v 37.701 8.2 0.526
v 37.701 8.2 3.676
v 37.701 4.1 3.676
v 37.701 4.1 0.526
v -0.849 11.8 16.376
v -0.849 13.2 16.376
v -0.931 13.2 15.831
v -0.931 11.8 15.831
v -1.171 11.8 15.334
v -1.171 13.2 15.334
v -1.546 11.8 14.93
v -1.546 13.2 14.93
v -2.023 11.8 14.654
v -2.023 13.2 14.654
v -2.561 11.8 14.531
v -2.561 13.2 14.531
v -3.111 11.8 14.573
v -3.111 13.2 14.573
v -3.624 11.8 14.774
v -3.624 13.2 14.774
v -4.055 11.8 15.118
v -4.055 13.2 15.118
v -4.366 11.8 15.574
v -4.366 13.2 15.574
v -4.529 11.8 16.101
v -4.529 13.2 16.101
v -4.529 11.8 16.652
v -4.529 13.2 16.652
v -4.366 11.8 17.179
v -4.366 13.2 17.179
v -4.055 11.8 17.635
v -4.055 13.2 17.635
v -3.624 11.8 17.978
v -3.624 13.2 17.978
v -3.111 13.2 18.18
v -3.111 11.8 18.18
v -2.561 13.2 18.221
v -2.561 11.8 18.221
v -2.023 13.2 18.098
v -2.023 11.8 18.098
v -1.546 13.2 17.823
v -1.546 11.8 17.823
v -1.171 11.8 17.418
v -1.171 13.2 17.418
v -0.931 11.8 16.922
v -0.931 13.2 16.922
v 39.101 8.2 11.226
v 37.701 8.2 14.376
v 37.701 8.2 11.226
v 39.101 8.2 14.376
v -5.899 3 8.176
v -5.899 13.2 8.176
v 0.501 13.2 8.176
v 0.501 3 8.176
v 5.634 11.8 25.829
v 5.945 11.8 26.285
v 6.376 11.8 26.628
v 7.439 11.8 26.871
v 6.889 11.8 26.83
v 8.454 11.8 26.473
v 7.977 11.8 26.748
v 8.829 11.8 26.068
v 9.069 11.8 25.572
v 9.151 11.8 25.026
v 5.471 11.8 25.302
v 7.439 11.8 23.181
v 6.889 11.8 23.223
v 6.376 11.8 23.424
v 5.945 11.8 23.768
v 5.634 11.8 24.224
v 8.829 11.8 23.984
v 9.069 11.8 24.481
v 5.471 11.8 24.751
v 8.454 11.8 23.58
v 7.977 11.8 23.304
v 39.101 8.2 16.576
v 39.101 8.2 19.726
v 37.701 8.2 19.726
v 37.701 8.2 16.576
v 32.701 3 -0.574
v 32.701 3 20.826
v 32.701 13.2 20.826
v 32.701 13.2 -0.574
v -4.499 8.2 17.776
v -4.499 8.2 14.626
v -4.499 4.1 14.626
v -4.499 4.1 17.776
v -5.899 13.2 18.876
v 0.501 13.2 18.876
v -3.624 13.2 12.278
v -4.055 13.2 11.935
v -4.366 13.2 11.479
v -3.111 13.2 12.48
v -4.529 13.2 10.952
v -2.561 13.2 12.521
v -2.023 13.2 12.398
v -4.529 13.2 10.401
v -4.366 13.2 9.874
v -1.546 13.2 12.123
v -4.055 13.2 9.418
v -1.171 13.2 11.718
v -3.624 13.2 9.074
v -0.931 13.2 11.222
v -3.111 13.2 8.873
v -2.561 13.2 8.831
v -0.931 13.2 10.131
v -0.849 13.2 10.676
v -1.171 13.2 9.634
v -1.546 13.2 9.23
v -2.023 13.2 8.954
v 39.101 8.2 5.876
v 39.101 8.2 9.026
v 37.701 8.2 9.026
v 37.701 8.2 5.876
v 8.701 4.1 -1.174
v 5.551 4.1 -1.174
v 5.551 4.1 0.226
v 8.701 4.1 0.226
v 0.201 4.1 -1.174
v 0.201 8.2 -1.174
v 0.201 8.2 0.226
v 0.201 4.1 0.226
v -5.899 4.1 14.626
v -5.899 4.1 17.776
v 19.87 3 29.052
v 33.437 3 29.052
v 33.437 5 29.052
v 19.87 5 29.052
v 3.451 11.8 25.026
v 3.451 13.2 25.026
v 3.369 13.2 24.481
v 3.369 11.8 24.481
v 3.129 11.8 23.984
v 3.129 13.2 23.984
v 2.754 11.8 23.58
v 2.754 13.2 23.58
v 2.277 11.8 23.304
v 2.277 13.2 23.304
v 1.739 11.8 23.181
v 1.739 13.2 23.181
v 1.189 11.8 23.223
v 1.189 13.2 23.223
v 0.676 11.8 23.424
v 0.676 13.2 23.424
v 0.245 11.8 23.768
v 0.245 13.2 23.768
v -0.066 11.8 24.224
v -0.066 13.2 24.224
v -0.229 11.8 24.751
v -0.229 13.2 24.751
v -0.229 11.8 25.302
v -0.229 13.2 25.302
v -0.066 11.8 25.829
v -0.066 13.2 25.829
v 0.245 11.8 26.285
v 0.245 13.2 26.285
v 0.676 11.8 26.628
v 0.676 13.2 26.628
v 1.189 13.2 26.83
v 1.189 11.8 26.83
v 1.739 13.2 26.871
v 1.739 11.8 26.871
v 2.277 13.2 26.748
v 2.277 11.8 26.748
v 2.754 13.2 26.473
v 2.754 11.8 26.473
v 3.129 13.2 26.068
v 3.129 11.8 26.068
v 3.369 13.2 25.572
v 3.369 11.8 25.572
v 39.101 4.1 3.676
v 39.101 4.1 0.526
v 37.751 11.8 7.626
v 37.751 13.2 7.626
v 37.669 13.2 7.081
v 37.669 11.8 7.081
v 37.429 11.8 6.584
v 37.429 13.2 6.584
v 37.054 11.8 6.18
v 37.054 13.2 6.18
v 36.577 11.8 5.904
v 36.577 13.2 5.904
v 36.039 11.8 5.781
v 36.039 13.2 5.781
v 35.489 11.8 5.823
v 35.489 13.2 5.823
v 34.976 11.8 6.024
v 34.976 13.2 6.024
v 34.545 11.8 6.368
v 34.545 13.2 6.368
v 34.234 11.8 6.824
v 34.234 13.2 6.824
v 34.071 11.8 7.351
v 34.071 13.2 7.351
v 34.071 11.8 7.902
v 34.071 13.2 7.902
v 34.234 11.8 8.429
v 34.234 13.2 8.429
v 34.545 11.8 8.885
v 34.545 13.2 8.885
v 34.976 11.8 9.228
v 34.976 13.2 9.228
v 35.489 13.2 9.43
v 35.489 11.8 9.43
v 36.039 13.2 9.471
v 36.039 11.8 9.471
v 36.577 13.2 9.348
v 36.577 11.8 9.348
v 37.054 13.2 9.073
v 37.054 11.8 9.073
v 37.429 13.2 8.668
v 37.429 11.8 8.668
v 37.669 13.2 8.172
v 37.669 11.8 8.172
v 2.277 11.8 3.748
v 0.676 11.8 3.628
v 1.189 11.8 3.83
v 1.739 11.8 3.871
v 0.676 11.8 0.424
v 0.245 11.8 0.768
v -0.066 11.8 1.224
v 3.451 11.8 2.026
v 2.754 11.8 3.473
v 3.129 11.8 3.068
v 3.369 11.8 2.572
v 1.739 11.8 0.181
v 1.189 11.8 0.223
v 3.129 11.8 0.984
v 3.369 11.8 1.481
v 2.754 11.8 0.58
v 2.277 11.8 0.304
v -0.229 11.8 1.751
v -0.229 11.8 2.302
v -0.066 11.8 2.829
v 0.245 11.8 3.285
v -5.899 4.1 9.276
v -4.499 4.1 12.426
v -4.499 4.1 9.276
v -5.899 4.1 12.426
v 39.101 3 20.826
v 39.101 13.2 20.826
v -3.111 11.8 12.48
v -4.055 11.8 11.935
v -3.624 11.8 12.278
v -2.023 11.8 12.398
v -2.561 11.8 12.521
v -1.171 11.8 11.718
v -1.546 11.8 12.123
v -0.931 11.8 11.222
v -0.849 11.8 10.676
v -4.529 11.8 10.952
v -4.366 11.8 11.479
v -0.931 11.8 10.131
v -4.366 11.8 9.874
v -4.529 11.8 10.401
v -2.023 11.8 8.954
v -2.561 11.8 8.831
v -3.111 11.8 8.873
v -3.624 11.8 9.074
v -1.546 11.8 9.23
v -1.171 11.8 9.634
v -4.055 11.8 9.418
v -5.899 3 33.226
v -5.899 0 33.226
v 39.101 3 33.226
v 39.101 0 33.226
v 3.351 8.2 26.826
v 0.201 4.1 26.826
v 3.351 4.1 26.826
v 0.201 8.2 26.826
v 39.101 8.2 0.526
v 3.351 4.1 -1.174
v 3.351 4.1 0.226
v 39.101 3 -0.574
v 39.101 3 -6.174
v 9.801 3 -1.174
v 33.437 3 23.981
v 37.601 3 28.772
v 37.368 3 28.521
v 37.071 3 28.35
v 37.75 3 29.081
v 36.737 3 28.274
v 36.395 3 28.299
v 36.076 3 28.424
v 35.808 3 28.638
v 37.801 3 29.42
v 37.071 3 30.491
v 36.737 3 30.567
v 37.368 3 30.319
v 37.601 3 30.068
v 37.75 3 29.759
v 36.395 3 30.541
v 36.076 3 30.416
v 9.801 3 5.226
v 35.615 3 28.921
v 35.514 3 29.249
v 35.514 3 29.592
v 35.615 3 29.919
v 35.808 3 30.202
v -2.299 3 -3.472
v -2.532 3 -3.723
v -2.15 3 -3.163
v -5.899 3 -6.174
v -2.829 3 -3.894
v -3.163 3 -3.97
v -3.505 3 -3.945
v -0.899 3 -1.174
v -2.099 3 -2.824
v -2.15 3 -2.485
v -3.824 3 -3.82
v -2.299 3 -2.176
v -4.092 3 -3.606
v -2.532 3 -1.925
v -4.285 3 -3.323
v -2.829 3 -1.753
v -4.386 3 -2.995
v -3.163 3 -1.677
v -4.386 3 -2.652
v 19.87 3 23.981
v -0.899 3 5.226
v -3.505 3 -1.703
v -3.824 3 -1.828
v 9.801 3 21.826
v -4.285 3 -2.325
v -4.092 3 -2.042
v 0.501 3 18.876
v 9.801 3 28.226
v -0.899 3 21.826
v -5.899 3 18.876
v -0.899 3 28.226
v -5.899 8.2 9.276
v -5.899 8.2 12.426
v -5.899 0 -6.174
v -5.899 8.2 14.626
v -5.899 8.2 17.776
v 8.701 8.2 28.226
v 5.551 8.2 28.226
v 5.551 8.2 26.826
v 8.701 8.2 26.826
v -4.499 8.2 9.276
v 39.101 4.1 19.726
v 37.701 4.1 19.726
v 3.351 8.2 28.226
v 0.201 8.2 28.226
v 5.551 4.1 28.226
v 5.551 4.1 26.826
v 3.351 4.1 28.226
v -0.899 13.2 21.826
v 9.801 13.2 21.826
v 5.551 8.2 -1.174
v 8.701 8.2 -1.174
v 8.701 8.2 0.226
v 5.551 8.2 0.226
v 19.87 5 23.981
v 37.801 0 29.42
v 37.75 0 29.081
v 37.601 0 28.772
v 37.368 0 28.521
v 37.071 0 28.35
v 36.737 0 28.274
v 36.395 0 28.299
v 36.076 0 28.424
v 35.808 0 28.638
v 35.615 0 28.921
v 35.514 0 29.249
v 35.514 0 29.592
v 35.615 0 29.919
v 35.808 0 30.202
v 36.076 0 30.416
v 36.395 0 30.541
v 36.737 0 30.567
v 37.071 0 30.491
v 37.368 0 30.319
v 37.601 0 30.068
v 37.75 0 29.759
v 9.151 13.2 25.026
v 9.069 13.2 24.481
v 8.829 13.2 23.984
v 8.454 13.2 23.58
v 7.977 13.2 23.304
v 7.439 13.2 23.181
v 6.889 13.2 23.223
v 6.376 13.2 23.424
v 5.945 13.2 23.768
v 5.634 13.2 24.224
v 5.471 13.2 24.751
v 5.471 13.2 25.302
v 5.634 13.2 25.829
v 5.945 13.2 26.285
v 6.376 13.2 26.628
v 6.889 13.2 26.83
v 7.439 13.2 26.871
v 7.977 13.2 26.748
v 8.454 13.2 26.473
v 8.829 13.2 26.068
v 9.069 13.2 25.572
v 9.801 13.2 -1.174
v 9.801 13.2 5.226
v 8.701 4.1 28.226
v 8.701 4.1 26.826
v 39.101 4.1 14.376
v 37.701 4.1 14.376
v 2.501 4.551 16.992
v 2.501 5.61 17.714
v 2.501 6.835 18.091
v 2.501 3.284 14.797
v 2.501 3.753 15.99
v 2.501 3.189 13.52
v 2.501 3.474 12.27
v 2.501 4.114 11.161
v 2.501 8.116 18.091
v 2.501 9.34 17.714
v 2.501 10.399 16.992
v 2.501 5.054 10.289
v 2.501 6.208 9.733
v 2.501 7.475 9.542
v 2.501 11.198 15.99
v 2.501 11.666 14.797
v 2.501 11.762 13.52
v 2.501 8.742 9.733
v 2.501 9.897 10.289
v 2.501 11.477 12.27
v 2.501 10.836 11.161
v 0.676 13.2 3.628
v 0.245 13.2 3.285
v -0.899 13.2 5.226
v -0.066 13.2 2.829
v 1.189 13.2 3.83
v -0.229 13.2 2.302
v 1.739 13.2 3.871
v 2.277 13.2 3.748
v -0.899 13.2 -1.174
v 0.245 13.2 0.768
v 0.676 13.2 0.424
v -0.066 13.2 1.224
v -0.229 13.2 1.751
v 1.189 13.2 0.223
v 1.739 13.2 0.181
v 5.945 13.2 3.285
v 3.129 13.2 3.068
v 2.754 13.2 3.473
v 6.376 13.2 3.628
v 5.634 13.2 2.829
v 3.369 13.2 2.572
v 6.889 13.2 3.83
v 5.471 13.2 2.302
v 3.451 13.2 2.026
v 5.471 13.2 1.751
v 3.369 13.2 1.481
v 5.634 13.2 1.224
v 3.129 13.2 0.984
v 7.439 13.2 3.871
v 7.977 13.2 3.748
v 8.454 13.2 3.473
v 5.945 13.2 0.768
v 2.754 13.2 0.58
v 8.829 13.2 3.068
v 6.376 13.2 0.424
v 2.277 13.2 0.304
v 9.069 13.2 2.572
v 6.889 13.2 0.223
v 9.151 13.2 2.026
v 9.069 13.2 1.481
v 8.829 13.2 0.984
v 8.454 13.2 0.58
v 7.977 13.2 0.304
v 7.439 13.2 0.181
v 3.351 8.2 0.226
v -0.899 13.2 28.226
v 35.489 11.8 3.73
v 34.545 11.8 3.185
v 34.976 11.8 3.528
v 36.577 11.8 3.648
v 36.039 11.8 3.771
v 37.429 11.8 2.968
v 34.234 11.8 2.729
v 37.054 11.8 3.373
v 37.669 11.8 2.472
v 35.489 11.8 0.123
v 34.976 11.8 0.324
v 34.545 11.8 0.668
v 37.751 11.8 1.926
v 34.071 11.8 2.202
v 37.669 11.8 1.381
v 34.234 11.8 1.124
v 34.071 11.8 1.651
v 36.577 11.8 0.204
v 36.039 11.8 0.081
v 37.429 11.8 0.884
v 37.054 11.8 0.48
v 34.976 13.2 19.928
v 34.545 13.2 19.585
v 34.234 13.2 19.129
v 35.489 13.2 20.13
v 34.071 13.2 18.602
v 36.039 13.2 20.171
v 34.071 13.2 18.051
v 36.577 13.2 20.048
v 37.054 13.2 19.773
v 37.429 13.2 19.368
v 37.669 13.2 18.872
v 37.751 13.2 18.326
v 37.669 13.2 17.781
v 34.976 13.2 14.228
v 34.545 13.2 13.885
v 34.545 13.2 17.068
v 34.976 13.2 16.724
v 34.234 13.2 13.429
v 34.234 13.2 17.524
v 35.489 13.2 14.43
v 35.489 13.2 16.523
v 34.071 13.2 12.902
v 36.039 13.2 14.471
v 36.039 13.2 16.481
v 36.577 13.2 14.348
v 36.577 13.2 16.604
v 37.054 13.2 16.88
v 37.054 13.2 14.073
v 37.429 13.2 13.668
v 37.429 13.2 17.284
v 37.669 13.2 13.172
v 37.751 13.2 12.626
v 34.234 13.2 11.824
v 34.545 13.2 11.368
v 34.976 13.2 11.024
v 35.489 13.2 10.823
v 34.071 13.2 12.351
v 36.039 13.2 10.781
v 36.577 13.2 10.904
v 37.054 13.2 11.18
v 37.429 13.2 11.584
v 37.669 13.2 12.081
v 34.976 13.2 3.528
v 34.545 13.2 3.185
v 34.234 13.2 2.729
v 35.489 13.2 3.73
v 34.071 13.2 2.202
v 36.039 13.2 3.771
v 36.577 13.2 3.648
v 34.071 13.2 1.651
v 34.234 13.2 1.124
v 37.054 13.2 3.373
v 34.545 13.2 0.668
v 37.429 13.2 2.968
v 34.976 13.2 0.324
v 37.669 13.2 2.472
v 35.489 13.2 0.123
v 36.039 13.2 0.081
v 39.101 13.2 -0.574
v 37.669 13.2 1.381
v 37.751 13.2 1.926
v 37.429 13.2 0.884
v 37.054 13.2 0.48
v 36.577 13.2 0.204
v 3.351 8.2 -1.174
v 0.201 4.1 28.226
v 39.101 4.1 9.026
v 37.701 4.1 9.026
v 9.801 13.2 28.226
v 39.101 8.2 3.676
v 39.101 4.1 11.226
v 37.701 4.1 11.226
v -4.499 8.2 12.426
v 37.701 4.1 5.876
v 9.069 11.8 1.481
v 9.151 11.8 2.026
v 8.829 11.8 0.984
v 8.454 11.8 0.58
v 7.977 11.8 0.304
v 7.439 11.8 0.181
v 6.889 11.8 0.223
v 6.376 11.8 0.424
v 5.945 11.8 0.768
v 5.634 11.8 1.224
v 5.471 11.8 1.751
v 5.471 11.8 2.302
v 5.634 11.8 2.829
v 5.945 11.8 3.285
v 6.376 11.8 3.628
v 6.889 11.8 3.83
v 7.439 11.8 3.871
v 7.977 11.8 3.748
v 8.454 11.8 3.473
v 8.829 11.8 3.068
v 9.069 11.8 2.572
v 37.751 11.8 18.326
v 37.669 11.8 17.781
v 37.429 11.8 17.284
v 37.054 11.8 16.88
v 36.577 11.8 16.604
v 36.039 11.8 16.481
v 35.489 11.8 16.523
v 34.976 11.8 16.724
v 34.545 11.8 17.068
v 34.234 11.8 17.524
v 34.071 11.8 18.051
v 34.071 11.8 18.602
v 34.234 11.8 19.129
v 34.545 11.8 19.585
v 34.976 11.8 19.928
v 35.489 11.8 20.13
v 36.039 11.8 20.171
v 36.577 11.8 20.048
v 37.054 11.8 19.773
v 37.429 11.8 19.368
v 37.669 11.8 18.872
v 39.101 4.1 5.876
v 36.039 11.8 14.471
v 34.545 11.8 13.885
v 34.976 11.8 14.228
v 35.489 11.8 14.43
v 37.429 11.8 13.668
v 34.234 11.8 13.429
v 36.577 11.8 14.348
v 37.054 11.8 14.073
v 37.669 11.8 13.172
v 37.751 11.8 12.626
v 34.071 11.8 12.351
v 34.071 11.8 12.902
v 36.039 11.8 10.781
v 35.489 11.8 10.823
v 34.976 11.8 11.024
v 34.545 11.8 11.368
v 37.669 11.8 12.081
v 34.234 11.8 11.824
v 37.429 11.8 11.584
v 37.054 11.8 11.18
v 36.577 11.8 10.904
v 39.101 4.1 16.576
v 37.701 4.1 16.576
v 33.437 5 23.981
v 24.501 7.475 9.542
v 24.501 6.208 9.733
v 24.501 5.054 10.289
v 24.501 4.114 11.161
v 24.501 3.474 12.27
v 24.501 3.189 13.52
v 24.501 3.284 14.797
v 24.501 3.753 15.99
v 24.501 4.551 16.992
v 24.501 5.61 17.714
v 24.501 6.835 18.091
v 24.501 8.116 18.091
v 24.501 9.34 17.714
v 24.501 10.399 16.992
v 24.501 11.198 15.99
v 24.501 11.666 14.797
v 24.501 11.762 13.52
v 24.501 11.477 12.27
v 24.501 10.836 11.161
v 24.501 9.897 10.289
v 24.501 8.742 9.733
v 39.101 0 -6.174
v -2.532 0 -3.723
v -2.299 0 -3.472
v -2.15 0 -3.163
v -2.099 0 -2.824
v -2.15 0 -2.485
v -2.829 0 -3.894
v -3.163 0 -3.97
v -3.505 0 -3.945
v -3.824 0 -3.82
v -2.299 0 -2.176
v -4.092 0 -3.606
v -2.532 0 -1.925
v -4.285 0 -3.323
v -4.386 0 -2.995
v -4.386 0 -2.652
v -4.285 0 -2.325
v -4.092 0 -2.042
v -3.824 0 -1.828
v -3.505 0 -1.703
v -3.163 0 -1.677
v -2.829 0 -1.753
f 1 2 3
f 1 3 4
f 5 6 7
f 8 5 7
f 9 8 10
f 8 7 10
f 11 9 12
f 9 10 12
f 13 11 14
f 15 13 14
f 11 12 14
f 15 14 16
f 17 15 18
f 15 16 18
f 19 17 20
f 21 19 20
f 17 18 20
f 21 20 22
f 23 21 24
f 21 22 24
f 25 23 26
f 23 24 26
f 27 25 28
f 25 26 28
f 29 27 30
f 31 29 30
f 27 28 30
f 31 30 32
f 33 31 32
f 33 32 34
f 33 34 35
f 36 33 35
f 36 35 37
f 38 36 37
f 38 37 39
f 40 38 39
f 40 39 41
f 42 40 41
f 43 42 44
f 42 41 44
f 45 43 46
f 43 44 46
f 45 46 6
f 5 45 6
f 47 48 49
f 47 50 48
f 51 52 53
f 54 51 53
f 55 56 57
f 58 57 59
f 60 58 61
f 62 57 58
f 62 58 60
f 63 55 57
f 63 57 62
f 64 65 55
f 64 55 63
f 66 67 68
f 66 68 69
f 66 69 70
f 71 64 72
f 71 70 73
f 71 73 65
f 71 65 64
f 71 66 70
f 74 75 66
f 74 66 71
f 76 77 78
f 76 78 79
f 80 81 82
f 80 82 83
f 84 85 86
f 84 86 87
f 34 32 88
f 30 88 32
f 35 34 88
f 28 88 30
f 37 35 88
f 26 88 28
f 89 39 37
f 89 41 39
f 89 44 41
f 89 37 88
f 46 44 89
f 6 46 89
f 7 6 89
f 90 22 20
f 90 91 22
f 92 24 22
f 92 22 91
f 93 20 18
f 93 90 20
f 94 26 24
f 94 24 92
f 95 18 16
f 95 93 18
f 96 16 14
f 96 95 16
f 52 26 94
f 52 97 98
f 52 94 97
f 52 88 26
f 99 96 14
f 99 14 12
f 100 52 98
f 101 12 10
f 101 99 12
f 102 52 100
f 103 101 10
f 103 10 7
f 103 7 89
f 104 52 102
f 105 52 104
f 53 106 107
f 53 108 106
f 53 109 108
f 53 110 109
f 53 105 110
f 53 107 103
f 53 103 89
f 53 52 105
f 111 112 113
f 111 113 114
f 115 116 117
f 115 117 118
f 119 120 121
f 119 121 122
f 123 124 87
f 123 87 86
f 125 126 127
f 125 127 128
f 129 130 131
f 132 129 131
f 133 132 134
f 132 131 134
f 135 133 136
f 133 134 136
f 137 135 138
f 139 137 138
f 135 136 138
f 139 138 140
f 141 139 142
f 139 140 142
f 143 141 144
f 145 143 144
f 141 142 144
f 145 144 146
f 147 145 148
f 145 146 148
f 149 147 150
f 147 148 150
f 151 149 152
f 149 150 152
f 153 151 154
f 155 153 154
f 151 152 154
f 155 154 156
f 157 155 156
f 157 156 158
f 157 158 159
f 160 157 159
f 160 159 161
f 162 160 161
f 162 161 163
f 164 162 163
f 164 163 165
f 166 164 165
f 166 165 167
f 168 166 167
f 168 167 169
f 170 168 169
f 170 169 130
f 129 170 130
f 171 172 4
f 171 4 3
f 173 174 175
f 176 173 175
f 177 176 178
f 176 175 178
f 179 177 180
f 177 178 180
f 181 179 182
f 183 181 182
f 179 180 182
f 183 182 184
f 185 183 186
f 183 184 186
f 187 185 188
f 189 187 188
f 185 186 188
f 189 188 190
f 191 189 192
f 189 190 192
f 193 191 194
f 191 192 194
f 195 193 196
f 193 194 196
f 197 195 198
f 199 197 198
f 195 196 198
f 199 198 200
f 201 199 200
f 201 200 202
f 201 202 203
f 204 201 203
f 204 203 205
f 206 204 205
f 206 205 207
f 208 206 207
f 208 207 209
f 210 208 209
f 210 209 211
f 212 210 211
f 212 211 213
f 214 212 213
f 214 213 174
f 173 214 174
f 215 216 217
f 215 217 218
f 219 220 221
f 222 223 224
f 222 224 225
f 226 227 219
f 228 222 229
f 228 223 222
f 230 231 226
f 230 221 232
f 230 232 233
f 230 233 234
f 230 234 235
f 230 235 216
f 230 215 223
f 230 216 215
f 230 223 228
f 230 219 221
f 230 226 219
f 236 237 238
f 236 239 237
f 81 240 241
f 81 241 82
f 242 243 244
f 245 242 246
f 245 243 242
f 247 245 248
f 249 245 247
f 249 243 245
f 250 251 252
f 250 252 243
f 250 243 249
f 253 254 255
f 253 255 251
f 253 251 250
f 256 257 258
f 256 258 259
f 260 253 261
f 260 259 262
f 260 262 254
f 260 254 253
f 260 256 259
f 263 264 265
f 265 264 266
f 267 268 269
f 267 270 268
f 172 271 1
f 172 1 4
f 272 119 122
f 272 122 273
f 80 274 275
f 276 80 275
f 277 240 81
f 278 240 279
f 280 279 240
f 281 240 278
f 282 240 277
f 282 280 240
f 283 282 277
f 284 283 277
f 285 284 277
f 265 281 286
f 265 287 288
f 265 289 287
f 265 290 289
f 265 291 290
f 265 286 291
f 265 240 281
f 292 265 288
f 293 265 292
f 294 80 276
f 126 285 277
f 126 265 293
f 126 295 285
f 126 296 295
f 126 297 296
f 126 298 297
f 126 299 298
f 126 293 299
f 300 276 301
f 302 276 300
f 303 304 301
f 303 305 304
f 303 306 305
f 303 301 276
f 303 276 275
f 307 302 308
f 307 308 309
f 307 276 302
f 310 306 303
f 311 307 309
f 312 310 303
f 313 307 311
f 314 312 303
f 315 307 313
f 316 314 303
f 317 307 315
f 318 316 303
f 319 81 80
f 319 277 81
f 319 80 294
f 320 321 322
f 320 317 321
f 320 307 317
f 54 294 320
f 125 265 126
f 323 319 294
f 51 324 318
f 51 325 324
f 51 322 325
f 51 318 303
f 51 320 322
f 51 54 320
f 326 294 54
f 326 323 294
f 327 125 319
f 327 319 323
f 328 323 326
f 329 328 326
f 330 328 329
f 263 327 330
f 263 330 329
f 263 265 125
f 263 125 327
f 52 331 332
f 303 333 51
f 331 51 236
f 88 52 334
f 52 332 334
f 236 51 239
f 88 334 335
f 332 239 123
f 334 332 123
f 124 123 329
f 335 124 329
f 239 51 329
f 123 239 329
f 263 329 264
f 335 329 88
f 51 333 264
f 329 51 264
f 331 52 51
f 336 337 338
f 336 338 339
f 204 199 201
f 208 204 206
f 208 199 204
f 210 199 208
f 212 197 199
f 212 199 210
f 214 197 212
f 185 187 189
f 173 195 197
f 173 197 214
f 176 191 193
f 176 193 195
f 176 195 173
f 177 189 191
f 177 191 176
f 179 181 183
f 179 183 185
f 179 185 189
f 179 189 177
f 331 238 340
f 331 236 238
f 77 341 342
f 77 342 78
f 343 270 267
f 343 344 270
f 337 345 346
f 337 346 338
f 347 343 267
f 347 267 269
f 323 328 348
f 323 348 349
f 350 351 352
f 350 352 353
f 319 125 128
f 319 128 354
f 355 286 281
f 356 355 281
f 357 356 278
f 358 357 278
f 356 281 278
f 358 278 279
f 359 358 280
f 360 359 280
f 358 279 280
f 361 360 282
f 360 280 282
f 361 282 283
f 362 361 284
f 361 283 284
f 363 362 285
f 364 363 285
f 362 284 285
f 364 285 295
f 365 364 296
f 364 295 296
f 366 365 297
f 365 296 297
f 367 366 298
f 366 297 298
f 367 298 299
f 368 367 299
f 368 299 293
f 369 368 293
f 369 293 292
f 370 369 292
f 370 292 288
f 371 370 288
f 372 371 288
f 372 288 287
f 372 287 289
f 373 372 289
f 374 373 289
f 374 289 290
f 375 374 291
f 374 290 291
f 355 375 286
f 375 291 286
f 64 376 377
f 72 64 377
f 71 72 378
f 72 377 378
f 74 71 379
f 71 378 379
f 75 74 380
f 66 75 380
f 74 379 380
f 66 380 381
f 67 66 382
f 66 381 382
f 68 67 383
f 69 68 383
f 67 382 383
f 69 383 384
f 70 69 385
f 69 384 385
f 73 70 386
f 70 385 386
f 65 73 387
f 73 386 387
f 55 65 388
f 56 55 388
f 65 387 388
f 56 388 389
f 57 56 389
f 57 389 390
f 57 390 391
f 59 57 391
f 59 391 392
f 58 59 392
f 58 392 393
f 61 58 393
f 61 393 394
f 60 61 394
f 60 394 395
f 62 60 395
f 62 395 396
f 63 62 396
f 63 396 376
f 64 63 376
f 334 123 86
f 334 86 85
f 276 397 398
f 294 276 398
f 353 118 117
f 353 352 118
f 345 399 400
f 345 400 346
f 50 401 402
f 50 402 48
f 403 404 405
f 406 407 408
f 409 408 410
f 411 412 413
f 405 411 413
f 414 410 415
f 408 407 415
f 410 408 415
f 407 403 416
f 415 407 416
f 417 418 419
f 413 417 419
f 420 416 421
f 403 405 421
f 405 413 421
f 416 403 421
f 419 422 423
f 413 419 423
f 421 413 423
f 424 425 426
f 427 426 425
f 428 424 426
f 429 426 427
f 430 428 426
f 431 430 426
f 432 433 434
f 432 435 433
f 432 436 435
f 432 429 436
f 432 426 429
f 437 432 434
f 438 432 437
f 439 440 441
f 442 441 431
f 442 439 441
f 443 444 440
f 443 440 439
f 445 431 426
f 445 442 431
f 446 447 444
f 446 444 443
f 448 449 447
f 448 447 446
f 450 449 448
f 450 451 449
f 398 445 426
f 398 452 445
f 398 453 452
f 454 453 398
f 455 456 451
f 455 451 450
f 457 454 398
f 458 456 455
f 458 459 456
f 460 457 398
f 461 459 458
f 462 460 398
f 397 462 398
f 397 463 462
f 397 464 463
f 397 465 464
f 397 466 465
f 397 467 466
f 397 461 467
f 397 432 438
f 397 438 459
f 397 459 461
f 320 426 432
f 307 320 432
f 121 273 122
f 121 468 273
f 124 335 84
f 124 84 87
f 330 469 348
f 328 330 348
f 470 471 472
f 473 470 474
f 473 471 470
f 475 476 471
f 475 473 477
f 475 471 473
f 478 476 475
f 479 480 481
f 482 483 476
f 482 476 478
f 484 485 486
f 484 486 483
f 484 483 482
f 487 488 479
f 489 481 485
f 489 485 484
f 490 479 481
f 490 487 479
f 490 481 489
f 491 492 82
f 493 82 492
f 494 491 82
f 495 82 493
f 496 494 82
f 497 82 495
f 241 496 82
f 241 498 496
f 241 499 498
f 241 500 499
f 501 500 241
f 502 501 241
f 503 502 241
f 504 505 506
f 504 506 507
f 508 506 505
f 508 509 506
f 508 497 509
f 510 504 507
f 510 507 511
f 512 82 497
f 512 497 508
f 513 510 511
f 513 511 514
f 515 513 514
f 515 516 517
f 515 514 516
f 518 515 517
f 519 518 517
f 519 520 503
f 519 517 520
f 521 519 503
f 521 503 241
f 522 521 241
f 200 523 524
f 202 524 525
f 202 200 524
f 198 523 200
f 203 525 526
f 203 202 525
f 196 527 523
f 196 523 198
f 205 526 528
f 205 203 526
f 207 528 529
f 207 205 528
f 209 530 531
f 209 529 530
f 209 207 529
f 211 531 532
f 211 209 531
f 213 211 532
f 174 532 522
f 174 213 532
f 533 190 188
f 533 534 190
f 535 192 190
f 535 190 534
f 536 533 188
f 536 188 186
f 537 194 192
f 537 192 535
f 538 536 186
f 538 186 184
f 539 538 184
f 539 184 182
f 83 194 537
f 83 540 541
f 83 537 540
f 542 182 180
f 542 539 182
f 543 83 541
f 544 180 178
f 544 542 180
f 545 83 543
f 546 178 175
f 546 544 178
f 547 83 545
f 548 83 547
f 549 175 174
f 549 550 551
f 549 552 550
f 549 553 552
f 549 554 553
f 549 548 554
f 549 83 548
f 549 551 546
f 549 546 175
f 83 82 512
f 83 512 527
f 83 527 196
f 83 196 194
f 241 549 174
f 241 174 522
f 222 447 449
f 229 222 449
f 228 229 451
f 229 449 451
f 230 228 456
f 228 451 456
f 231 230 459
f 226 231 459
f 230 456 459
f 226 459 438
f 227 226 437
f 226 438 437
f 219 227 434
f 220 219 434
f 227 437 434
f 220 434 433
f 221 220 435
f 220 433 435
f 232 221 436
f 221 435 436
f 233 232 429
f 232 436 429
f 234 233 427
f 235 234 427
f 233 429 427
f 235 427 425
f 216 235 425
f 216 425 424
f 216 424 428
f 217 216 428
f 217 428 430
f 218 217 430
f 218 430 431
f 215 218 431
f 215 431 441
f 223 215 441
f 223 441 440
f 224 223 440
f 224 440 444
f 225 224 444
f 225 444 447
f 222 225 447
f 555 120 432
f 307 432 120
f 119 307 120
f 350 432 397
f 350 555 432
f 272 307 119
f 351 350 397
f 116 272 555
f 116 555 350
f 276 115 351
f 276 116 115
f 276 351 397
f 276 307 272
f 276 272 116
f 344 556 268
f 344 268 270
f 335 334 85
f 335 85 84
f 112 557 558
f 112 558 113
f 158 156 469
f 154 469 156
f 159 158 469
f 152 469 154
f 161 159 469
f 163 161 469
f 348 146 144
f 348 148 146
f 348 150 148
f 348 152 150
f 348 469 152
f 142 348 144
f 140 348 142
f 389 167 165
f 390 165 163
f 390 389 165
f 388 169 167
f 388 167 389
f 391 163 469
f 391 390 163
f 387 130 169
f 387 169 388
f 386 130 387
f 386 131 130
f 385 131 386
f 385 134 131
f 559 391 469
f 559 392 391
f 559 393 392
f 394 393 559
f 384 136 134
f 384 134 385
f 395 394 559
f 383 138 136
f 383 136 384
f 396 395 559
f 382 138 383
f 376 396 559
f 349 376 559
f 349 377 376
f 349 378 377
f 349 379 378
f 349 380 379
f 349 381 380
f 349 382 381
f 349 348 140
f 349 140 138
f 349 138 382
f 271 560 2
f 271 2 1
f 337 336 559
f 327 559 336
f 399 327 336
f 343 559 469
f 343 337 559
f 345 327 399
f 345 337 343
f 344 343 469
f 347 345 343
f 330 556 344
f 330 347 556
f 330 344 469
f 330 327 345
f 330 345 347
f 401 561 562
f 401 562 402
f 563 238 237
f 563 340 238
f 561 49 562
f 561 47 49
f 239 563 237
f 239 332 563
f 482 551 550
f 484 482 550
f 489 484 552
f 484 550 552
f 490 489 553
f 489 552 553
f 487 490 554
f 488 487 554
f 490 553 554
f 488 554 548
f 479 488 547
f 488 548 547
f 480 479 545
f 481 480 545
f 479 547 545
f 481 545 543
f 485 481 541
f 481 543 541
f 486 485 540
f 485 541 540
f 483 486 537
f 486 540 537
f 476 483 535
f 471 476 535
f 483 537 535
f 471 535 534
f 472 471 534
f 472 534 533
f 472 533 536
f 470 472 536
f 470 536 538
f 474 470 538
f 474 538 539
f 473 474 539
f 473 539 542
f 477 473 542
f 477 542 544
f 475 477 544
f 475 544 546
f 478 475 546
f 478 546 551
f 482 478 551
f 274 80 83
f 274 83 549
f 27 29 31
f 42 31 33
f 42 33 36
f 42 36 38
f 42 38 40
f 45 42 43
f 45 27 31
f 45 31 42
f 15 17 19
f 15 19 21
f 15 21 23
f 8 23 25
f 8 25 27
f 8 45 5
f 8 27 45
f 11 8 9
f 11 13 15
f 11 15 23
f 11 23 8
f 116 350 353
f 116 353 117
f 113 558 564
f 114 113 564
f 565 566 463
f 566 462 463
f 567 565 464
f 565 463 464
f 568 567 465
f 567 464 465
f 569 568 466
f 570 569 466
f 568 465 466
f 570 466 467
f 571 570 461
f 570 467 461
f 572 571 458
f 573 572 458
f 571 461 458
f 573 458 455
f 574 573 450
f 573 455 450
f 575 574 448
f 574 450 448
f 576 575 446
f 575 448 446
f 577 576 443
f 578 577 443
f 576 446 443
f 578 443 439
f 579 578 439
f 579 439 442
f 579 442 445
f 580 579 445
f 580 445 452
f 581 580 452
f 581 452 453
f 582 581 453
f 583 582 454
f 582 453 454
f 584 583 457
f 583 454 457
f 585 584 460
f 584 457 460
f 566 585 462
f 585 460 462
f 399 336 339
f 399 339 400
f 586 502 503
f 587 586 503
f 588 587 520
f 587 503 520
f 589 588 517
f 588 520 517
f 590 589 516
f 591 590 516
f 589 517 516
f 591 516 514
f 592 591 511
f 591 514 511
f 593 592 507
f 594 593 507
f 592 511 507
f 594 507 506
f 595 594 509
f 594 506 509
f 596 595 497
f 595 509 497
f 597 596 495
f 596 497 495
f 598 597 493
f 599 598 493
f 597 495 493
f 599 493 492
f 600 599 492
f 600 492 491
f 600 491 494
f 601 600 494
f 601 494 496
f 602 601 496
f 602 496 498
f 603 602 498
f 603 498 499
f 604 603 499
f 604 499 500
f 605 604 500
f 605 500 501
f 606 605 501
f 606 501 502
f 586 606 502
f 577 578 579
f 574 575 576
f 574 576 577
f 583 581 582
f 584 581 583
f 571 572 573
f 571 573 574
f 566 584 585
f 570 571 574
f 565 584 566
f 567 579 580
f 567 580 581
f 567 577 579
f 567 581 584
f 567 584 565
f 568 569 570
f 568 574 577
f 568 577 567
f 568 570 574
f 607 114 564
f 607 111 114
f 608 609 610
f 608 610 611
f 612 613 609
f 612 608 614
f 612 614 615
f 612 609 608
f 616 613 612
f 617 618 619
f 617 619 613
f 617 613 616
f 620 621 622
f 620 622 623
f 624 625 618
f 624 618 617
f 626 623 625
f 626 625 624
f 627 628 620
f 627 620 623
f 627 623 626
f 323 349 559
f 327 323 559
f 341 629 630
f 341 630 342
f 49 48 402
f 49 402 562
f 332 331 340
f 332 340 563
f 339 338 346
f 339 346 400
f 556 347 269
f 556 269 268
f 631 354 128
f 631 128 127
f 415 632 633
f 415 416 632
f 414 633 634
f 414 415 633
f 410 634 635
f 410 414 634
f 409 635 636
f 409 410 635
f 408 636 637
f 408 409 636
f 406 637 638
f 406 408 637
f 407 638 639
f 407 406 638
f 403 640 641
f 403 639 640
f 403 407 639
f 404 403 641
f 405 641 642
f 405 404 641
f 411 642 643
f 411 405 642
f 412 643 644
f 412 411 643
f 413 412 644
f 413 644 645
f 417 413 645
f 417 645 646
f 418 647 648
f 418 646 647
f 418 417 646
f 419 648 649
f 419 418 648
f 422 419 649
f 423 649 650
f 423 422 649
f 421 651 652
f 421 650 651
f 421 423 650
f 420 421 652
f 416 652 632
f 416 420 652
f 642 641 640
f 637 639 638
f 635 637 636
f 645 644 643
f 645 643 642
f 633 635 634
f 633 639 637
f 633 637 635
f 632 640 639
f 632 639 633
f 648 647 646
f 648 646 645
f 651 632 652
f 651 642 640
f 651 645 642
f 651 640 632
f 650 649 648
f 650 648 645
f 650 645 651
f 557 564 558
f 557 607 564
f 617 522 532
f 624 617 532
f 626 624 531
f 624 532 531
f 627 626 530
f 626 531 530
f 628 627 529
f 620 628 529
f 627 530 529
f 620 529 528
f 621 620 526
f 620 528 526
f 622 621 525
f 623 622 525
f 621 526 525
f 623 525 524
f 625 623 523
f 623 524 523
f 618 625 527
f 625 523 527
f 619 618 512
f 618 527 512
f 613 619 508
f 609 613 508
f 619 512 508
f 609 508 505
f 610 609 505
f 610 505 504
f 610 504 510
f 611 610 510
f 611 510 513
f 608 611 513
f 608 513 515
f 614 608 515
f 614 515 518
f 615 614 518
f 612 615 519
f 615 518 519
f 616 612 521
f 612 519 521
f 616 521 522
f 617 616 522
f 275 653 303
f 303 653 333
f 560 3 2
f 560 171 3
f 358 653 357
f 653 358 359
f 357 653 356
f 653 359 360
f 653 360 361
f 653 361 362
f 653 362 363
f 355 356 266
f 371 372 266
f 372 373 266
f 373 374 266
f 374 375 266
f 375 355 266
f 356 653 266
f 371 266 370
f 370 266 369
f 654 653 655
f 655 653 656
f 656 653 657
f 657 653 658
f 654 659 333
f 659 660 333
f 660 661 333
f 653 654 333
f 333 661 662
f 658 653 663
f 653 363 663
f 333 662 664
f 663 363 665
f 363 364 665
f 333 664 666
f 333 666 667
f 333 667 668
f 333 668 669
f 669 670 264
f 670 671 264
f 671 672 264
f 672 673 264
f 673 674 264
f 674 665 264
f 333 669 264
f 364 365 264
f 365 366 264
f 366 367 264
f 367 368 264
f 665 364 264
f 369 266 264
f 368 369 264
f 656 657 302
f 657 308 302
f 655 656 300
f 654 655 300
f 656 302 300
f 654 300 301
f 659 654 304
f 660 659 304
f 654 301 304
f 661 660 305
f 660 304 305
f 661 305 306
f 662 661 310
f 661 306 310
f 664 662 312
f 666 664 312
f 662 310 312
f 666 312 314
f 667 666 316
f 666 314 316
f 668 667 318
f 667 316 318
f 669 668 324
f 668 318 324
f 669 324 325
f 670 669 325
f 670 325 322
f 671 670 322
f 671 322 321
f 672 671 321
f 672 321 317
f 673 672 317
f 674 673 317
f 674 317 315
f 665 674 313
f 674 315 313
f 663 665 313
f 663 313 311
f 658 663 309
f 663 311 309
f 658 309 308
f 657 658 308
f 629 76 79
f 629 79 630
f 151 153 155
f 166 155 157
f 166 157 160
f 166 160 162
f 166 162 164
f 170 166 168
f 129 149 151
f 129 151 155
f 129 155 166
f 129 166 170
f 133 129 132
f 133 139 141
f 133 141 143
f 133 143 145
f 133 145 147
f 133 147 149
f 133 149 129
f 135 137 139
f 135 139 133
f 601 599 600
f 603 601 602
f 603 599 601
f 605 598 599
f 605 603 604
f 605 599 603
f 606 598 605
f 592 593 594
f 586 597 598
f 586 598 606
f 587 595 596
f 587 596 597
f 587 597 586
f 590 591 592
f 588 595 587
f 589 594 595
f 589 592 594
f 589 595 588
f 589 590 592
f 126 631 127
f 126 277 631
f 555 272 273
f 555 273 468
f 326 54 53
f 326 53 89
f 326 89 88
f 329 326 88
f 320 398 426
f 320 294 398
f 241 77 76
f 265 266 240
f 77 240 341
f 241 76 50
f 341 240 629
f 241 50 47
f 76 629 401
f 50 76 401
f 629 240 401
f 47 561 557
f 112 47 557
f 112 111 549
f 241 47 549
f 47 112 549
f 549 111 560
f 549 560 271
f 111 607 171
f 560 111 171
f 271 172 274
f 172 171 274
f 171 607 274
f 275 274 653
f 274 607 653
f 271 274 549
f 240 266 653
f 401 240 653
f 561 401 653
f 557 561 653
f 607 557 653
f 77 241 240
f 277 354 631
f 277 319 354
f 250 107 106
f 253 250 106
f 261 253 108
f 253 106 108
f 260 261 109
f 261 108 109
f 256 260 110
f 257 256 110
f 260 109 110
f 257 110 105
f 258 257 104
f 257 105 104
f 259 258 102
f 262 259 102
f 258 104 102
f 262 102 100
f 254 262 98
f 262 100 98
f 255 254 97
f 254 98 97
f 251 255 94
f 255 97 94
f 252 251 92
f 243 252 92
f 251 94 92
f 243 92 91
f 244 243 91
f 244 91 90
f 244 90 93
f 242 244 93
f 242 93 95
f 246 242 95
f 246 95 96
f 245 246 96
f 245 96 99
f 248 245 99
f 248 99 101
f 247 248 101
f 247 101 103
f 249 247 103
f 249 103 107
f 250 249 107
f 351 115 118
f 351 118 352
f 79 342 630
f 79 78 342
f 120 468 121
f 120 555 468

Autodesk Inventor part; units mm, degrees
ref_plane "YZ Plane" through (0, 0, 0) normal (1, 0, 0) x (0, 1, 0)
ref_plane "XZ Plane" through (0, 0, 0) normal (0, 1, 0) x (-1, 0, 0)
sketch "Sketch1" plane through (0, 0, 0) normal (0, 1, 0) x (-1, 0, 0)
  line L0 (5.8992, 33.2263) -> (-39.1008, 33.2263)
  line L1 (-39.1008, 33.2263) -> (-39.1008, -6.1737)
  line L2 (-39.1008, -6.1737) -> (5.8992, -6.1737)
  line L3 (5.8992, -6.1737) -> (5.8992, 33.2263)
  point P0 (0, 0)
  dimension "d0" = 45
  dimension "d1" = 39.4
extrude "Extrusion1" add sketch "Sketch1" along normal blind 3
sketch "Sketch2" plane through (0, 3, 0) normal (0, 1, 0) x (1, 0, 0)
  line L0 (-5.8992, 6.1737) -> (-5.8992, -33.2263) projected
  line L1 (-5.8992, -8.1763) -> (0.5008, -8.1763)
  line L2 (0.5008, -8.1763) -> (0.5008, -18.8763)
  line L3 (0.5008, -18.8763) -> (-5.8992, -18.8763)
  line L4 (-5.8992, -18.8763) -> (-5.8992, -8.1763)
  line L5 (39.1008, 6.1737) -> (-5.8992, 6.1737) projected
  line L6 (-5.8992, -33.2263) -> (39.1008, -33.2263) projected
  point P0 (0, 0)
  dimension "d4" = 14.35
  dimension "d5" = 14.35
  dimension "d6" = 6.4
extrude "Extrusion2" add sketch "Sketch2" along normal blind 10.2
sketch "Sketch3" plane through (0, 13.2, 0) normal (0, 1, 0) x (1, 0, 0)
  circle A0 centre (-2.6992, -16.3763) radius 1.85
  line L0 (-5.8992, -18.8763) -> (0.5008, -18.8763) projected
  circle A1 centre (-2.6992, -10.6763) radius 1.85
  line L1 (0.5008, -8.1763) -> (-5.8992, -8.1763) projected
  line L2 (0.5008, -18.8763) -> (0.5008, -8.1763) projected
  line L3 (-5.8992, -8.1763) -> (-5.8992, -18.8763) projected
  point P0 (0, 0)
  dimension "d10" = 3.7
  dimension "d12" = 2.5
  dimension "d13" = 3.7
  dimension "d14" = 2.5
  dimension "d17" = 3.2
  dimension "d18" = 3.2
extrude "Extrusion3" cut sketch "Sketch3" against normal blind 1.4 contours A0 | A1
sketch "Sketch4" plane through (0, 3, 0) normal (0, 1, 0) x (1, 0, 0)
  line L0 (-0.8992, -21.8263) -> (9.8008, -21.8263)
  line L1 (9.8008, -21.8263) -> (9.8008, -28.2263)
  line L2 (9.8008, -28.2263) -> (-0.8992, -28.2263)
  line L3 (-0.8992, -28.2263) -> (-0.8992, -21.8263)
  line L4 (-5.8992, -33.2263) -> (39.1008, -33.2263) projected
  line L5 (-5.8992, -18.8763) -> (-5.8992, -33.2263) projected
  line L6 (-0.8992, 1.1737) -> (9.8008, 1.1737)
  line L7 (9.8008, 1.1737) -> (9.8008, -5.2263)
  line L8 (9.8008, -5.2263) -> (-0.8992, -5.2263)
  line L9 (-0.8992, -5.2263) -> (-0.8992, 1.1737)
  line L10 (-5.8992, 6.1737) -> (-5.8992, -8.1763) projected
  line L11 (39.1008, 6.1737) -> (-5.8992, 6.1737) projected
  circle A0 centre (1.6008, -25.0263) radius 1.85
  circle A1 centre (7.3008, -25.0263) radius 1.85
  circle A2 centre (1.6008, -2.0263) radius 1.85
  circle A3 centre (7.3008, -2.0263) radius 1.85
  point P0 (0, 0)
  dimension "d21" = 5
  dimension "d22" = 5
  dimension "d23" = 6.4
  dimension "d24" = 10.7
  dimension "d25" = 10.7
  dimension "d26" = 5
  dimension "d27" = 5
  dimension "d28" = 6.4
  dimension "d29" = 3.7
  dimension "d30" = 2.5
  dimension "d31" = 3.2
  dimension "d32" = 3.7
  dimension "d33" = 2.5
  dimension "d34" = 3.2
  dimension "d35" = 3.7
  dimension "d36" = 3.7
  dimension "d37" = 2.5
  dimension "d38" = 3.2
  dimension "d39" = 3.2
  dimension "d40" = 2.5
extrude "Extrusion4" add sketch "Sketch4" along normal blind 10.2 contours L0 L1 L2 L3 | L6 L7 L8 L9 | A0 | A1 | A2 | A3
sketch "Sketch5" plane through (0, 13.2, 0) normal (0, 1, 0) x (1, 0, 0)
  circle A0 centre (1.6008, -2.0263) radius 1.85
  circle A1 centre (7.3008, -2.0263) radius 1.85
  line L0 (-0.8992, 1.1737) -> (-0.8992, -5.2263) projected
  line L1 (-0.8992, -5.2263) -> (9.8008, -5.2263) projected
  line L2 (9.8008, -5.2263) -> (9.8008, 1.1737) projected
  point P0 (0, 0)
  dimension "d43" = 3.7
  dimension "d44" = 3.7
  dimension "d45" = 2.5
  dimension "d46" = 3.2
  dimension "d47" = 3.2
  dimension "d48" = 2.5
extrude "Extrusion5" cut sketch "Sketch5" against normal blind 1.4
sketch "Sketch6" plane through (0, 13.2, 0) normal (0, 1, 0) x (1, 0, 0)
  circle A0 centre (1.6008, -25.0263) radius 1.85
  circle A1 centre (7.3008, -25.0263) radius 1.85
  line L0 (9.8008, -21.8263) -> (-0.8992, -21.8263) projected
  line L1 (-0.8992, -21.8263) -> (-0.8992, -28.2263) projected
  line L2 (9.8008, -28.2263) -> (9.8008, -21.8263) projected
  point P0 (0, 0)
  dimension "d51" = 3.7
  dimension "d52" = 3.7
  dimension "d53" = 3.2
  dimension "d54" = 2.5
  dimension "d55" = 3.2
  dimension "d56" = 2.5
extrude "Extrusion6" cut sketch "Sketch6" against normal blind 1.4
sketch "Sketch7" plane through (0, 3, 0) normal (0, 1, 0) x (1, 0, 0)
  line L0 (39.1008, -33.2263) -> (39.1008, 6.1737) projected
  line L1 (39.1008, -20.8263) -> (32.7008, -20.8263)
  line L2 (32.7008, -20.8263) -> (32.7008, 0.5737)
  line L3 (32.7008, 0.5737) -> (39.1008, 0.5737)
  line L4 (39.1008, 0.5737) -> (39.1008, -20.8263)
  line L5 (39.1008, 6.1737) -> (-5.8992, 6.1737) projected
  point P0 (0, 0)
  dimension "d59" = 6.4
  dimension "d60" = 21.4
  dimension "d61" = 5.6
extrude "Extrusion7" add sketch "Sketch7" along normal blind 10.2
sketch "Sketch8" plane through (0, 13.2, 0) normal (0, 1, 0) x (1, 0, 0)
  circle A0 centre (35.9008, -1.9263) radius 1.85
  circle A1 centre (35.9008, -7.6263) radius 1.85
  circle A2 centre (35.9008, -12.6263) radius 1.85
  circle A3 centre (35.9008, -18.3263) radius 1.85
  line L0 (39.1008, -20.8263) -> (39.1008, 0.5737) projected
  line L1 (39.1008, 0.5737) -> (32.7008, 0.5737) projected
  line L2 (32.7008, -20.8263) -> (39.1008, -20.8263) projected
  point P0 (0, 0)
  dimension "d39" = 3.2
  dimension "d64" = 3.7
  dimension "d65" = 3.7
  dimension "d66" = 3.7
  dimension "d67" = 3.7
  dimension "d68" = 3.2
  dimension "d69" = 2.5
  dimension "d70" = 3.2
  dimension "d71" = 2.5
  dimension "d72" = 5.7
  dimension "d73" = 3.2
  dimension "d74" = 5.7
  dimension "d75" = 3.2
extrude "Extrusion8" cut sketch "Sketch8" against normal blind 1.4
sketch "Sketch10" plane through (9.8008, 3, -1.1737) normal (0, 0, -1) x (-1, 0, 0)
  line L0 (1.1, 5.2) -> (4.25, 5.2)
  line L1 (4.25, 5.2) -> (4.25, 1.1)
  line L2 (4.25, 1.1) -> (1.1, 1.1)
  line L3 (1.1, 1.1) -> (1.1, 5.2)
  line L4 (0, 0) -> (0, 10.2) projected
  line L5 (10.7, 0) -> (0, 0) projected
  line L6 (6.45, 5.2) -> (9.6, 5.2)
  line L7 (9.6, 5.2) -> (9.6, 1.1)
  line L8 (9.6, 1.1) -> (6.45, 1.1)
  line L9 (6.45, 1.1) -> (6.45, 5.2)
  line L10 (10.7, 0) -> (10.7, 10.2) projected
  point P0 (9.8008, -3)
  dimension "d78" = 1.1
  dimension "d79" = 1.1
  dimension "d80" = 4.1
  dimension "d81" = 1.1
  dimension "d82" = 2.2
  dimension "d83" = 4.1
  dimension "d84" = 1.1
  dimension "d85" = 3.15
extrude "Extrusion9" cut sketch "Sketch10" against normal blind 1.4
sketch "Sketch11" plane through (-5.8992, 0, -6.1737) normal (-1, 0, 0) x (0, 0, 1)
  line L0 (15.45, 8.2) -> (18.6, 8.2)
  line L1 (18.6, 8.2) -> (18.6, 4.1)
  line L2 (18.6, 4.1) -> (15.45, 4.1)
  line L3 (15.45, 4.1) -> (15.45, 8.2)
  line L4 (20.8, 8.2) -> (23.95, 8.2)
  line L5 (23.95, 8.2) -> (23.95, 4.1)
  line L6 (23.95, 4.1) -> (20.8, 4.1)
  line L7 (20.8, 4.1) -> (20.8, 8.2)
  line L8 (14.35, 3) -> (14.35, 13.2) projected
  line L9 (25.05, 3) -> (25.05, 13.2) projected
  line L10 (14.35, 3) -> (25.05, 3)
  line L11 (0, 3) -> (14.35, 3) projected
  point P0 (6.1737, 0)
  dimension "d88" = 1.1
  dimension "d89" = 2.2
  dimension "d90" = 1.1
  dimension "d91" = 1.1
  dimension "d92" = 3.15
  dimension "d93" = 4.1
extrude "Extrusion10" cut sketch "Sketch11" against normal blind 1.4
sketch "Sketch12" plane through (-0.8992, 3, 28.2263) normal (0, 0, 1) x (1, 0, 0)
  line L0 (1.1, 5.2) -> (4.25, 5.2)
  line L1 (4.25, 5.2) -> (4.25, 1.1)
  line L2 (4.25, 1.1) -> (1.1, 1.1)
  line L3 (1.1, 1.1) -> (1.1, 5.2)
  line L4 (6.45, 5.2) -> (9.6, 5.2)
  line L5 (9.6, 5.2) -> (9.6, 1.1)
  line L6 (9.6, 1.1) -> (6.45, 1.1)
  line L7 (6.45, 1.1) -> (6.45, 5.2)
  line L8 (10.7, 0) -> (10.7, 10.2) projected
  line L9 (-5, 0) -> (40, 0) projected
  point P0 (0.8992, -3)
  dimension "d96" = 3.15
  dimension "d97" = 3.15
  dimension "d98" = 2.2
  dimension "d99" = 1.1
  dimension "d100" = 4.1
  dimension "d101" = 1.1
extrude "Extrusion11" cut sketch "Sketch12" against normal blind 1.4
sketch "Sketch13" plane through (39.1008, 0, 33.2263) normal (1, 0, 0) x (0, 0, -1)
  line L0 (15.45, 4.1) -> (18.6, 4.1) projected
  line L1 (13.5, 8.2) -> (16.65, 8.2)
  line L2 (16.65, 8.2) -> (16.65, 4.1)
  line L3 (16.65, 4.1) -> (13.5, 4.1)
  line L4 (13.5, 4.1) -> (13.5, 8.2)
  line L5 (18.85, 8.2) -> (22, 8.2)
  line L6 (22, 8.2) -> (22, 4.1)
  line L7 (22, 4.1) -> (18.85, 4.1)
  line L8 (18.85, 4.1) -> (18.85, 8.2)
  line L9 (12.4, 3) -> (12.4, 13.2) projected
  line L10 (12.4, 3) -> (34.1653, 3)
  line L11 (33.8, 3) -> (39.4, 3) projected
  line L12 (33.8, 3) -> (33.8, 13.2) projected
  line L13 (24.2, 8.2) -> (27.35, 8.2)
  line L14 (27.35, 8.2) -> (27.35, 4.1)
  line L15 (27.35, 4.1) -> (24.2, 4.1)
  line L16 (24.2, 4.1) -> (24.2, 8.2)
  line L17 (29.55, 8.2) -> (32.7, 8.2)
  line L18 (32.7, 8.2) -> (32.7, 4.1)
  line L19 (32.7, 4.1) -> (29.55, 4.1)
  line L20 (29.55, 4.1) -> (29.55, 8.2)
  point P0 (33.2263, 0)
  dimension "d104" = 3.15
  dimension "d105" = 3.15
  dimension "d108" = 1.1
  dimension "d111" = 2.2
  dimension "d112" = 4.1
  dimension "d113" = 4.1
  dimension "d121" = 3.15
  dimension "d122" = 3.15
  dimension "d123" = 1.1
  dimension "d124" = 2.2
  dimension "d125" = 1.1
  dimension "d126" = 1.1
  dimension "d127" = 4.1
extrude "Extrusion12" cut sketch "Sketch13" against normal blind 1.4
ref_plane "Work Plane1" through (2.5008, 3, 18.8763) normal (1, 0, 0) x (0, 0, -1)
sketch "Sketch17" plane through (2.5008, 3, 18.8763) normal (1, 0, 0) x (0, 0, -1)
  circle A0 centre (5.0355, 4.4753) radius 4.2987
  point P0 (18.8763, -3)
extrude "Extrusion13" add sketch "Sketch17" along normal blind 22
sketch "Sketch18" plane through (0, 3, 0) normal (0, 1, 0) x (1, 0, 0)
  line L0 (33.4369, -29.0517) -> (19.8703, -29.0517)
  line L1 (19.8703, -29.0517) -> (19.8703, -23.9814)
  line L2 (19.8703, -23.9814) -> (33.4369, -23.9814)
  line L3 (33.4369, -23.9814) -> (33.4369, -29.0517)
  point P0 (0, 0)
extrude "Extrusion14" add sketch "Sketch18" along normal blind 2
sketch "Sketch19" plane through (0, 3, 0) normal (0, 1, 0) x (1, 0, 0)
  circle A0 centre (-3.2492, 2.8237) radius 1.15
  line L0 (39.1008, 6.1737) -> (-5.8992, 6.1737) projected
  line L1 (-5.8992, 6.1737) -> (-5.8992, -8.1763) projected
  circle A1 centre (36.6508, -29.4203) radius 1.15
  line L2 (-5.8992, -33.2263) -> (39.1008, -33.2263) projected
  line L3 (39.1008, -33.2263) -> (39.1008, -20.8263) projected
  point P0 (0, 0)
  dimension "d135" = 2.3
  dimension "d136" = 3.35
  dimension "d137" = 2.65
  dimension "d138" = 2.3
  dimension "d139" = 51.3
  dimension "d141" = 2.45
extrude "Extrusion15" cut sketch "Sketch19" against normal blind 3
properties part number "motorcontrol"
